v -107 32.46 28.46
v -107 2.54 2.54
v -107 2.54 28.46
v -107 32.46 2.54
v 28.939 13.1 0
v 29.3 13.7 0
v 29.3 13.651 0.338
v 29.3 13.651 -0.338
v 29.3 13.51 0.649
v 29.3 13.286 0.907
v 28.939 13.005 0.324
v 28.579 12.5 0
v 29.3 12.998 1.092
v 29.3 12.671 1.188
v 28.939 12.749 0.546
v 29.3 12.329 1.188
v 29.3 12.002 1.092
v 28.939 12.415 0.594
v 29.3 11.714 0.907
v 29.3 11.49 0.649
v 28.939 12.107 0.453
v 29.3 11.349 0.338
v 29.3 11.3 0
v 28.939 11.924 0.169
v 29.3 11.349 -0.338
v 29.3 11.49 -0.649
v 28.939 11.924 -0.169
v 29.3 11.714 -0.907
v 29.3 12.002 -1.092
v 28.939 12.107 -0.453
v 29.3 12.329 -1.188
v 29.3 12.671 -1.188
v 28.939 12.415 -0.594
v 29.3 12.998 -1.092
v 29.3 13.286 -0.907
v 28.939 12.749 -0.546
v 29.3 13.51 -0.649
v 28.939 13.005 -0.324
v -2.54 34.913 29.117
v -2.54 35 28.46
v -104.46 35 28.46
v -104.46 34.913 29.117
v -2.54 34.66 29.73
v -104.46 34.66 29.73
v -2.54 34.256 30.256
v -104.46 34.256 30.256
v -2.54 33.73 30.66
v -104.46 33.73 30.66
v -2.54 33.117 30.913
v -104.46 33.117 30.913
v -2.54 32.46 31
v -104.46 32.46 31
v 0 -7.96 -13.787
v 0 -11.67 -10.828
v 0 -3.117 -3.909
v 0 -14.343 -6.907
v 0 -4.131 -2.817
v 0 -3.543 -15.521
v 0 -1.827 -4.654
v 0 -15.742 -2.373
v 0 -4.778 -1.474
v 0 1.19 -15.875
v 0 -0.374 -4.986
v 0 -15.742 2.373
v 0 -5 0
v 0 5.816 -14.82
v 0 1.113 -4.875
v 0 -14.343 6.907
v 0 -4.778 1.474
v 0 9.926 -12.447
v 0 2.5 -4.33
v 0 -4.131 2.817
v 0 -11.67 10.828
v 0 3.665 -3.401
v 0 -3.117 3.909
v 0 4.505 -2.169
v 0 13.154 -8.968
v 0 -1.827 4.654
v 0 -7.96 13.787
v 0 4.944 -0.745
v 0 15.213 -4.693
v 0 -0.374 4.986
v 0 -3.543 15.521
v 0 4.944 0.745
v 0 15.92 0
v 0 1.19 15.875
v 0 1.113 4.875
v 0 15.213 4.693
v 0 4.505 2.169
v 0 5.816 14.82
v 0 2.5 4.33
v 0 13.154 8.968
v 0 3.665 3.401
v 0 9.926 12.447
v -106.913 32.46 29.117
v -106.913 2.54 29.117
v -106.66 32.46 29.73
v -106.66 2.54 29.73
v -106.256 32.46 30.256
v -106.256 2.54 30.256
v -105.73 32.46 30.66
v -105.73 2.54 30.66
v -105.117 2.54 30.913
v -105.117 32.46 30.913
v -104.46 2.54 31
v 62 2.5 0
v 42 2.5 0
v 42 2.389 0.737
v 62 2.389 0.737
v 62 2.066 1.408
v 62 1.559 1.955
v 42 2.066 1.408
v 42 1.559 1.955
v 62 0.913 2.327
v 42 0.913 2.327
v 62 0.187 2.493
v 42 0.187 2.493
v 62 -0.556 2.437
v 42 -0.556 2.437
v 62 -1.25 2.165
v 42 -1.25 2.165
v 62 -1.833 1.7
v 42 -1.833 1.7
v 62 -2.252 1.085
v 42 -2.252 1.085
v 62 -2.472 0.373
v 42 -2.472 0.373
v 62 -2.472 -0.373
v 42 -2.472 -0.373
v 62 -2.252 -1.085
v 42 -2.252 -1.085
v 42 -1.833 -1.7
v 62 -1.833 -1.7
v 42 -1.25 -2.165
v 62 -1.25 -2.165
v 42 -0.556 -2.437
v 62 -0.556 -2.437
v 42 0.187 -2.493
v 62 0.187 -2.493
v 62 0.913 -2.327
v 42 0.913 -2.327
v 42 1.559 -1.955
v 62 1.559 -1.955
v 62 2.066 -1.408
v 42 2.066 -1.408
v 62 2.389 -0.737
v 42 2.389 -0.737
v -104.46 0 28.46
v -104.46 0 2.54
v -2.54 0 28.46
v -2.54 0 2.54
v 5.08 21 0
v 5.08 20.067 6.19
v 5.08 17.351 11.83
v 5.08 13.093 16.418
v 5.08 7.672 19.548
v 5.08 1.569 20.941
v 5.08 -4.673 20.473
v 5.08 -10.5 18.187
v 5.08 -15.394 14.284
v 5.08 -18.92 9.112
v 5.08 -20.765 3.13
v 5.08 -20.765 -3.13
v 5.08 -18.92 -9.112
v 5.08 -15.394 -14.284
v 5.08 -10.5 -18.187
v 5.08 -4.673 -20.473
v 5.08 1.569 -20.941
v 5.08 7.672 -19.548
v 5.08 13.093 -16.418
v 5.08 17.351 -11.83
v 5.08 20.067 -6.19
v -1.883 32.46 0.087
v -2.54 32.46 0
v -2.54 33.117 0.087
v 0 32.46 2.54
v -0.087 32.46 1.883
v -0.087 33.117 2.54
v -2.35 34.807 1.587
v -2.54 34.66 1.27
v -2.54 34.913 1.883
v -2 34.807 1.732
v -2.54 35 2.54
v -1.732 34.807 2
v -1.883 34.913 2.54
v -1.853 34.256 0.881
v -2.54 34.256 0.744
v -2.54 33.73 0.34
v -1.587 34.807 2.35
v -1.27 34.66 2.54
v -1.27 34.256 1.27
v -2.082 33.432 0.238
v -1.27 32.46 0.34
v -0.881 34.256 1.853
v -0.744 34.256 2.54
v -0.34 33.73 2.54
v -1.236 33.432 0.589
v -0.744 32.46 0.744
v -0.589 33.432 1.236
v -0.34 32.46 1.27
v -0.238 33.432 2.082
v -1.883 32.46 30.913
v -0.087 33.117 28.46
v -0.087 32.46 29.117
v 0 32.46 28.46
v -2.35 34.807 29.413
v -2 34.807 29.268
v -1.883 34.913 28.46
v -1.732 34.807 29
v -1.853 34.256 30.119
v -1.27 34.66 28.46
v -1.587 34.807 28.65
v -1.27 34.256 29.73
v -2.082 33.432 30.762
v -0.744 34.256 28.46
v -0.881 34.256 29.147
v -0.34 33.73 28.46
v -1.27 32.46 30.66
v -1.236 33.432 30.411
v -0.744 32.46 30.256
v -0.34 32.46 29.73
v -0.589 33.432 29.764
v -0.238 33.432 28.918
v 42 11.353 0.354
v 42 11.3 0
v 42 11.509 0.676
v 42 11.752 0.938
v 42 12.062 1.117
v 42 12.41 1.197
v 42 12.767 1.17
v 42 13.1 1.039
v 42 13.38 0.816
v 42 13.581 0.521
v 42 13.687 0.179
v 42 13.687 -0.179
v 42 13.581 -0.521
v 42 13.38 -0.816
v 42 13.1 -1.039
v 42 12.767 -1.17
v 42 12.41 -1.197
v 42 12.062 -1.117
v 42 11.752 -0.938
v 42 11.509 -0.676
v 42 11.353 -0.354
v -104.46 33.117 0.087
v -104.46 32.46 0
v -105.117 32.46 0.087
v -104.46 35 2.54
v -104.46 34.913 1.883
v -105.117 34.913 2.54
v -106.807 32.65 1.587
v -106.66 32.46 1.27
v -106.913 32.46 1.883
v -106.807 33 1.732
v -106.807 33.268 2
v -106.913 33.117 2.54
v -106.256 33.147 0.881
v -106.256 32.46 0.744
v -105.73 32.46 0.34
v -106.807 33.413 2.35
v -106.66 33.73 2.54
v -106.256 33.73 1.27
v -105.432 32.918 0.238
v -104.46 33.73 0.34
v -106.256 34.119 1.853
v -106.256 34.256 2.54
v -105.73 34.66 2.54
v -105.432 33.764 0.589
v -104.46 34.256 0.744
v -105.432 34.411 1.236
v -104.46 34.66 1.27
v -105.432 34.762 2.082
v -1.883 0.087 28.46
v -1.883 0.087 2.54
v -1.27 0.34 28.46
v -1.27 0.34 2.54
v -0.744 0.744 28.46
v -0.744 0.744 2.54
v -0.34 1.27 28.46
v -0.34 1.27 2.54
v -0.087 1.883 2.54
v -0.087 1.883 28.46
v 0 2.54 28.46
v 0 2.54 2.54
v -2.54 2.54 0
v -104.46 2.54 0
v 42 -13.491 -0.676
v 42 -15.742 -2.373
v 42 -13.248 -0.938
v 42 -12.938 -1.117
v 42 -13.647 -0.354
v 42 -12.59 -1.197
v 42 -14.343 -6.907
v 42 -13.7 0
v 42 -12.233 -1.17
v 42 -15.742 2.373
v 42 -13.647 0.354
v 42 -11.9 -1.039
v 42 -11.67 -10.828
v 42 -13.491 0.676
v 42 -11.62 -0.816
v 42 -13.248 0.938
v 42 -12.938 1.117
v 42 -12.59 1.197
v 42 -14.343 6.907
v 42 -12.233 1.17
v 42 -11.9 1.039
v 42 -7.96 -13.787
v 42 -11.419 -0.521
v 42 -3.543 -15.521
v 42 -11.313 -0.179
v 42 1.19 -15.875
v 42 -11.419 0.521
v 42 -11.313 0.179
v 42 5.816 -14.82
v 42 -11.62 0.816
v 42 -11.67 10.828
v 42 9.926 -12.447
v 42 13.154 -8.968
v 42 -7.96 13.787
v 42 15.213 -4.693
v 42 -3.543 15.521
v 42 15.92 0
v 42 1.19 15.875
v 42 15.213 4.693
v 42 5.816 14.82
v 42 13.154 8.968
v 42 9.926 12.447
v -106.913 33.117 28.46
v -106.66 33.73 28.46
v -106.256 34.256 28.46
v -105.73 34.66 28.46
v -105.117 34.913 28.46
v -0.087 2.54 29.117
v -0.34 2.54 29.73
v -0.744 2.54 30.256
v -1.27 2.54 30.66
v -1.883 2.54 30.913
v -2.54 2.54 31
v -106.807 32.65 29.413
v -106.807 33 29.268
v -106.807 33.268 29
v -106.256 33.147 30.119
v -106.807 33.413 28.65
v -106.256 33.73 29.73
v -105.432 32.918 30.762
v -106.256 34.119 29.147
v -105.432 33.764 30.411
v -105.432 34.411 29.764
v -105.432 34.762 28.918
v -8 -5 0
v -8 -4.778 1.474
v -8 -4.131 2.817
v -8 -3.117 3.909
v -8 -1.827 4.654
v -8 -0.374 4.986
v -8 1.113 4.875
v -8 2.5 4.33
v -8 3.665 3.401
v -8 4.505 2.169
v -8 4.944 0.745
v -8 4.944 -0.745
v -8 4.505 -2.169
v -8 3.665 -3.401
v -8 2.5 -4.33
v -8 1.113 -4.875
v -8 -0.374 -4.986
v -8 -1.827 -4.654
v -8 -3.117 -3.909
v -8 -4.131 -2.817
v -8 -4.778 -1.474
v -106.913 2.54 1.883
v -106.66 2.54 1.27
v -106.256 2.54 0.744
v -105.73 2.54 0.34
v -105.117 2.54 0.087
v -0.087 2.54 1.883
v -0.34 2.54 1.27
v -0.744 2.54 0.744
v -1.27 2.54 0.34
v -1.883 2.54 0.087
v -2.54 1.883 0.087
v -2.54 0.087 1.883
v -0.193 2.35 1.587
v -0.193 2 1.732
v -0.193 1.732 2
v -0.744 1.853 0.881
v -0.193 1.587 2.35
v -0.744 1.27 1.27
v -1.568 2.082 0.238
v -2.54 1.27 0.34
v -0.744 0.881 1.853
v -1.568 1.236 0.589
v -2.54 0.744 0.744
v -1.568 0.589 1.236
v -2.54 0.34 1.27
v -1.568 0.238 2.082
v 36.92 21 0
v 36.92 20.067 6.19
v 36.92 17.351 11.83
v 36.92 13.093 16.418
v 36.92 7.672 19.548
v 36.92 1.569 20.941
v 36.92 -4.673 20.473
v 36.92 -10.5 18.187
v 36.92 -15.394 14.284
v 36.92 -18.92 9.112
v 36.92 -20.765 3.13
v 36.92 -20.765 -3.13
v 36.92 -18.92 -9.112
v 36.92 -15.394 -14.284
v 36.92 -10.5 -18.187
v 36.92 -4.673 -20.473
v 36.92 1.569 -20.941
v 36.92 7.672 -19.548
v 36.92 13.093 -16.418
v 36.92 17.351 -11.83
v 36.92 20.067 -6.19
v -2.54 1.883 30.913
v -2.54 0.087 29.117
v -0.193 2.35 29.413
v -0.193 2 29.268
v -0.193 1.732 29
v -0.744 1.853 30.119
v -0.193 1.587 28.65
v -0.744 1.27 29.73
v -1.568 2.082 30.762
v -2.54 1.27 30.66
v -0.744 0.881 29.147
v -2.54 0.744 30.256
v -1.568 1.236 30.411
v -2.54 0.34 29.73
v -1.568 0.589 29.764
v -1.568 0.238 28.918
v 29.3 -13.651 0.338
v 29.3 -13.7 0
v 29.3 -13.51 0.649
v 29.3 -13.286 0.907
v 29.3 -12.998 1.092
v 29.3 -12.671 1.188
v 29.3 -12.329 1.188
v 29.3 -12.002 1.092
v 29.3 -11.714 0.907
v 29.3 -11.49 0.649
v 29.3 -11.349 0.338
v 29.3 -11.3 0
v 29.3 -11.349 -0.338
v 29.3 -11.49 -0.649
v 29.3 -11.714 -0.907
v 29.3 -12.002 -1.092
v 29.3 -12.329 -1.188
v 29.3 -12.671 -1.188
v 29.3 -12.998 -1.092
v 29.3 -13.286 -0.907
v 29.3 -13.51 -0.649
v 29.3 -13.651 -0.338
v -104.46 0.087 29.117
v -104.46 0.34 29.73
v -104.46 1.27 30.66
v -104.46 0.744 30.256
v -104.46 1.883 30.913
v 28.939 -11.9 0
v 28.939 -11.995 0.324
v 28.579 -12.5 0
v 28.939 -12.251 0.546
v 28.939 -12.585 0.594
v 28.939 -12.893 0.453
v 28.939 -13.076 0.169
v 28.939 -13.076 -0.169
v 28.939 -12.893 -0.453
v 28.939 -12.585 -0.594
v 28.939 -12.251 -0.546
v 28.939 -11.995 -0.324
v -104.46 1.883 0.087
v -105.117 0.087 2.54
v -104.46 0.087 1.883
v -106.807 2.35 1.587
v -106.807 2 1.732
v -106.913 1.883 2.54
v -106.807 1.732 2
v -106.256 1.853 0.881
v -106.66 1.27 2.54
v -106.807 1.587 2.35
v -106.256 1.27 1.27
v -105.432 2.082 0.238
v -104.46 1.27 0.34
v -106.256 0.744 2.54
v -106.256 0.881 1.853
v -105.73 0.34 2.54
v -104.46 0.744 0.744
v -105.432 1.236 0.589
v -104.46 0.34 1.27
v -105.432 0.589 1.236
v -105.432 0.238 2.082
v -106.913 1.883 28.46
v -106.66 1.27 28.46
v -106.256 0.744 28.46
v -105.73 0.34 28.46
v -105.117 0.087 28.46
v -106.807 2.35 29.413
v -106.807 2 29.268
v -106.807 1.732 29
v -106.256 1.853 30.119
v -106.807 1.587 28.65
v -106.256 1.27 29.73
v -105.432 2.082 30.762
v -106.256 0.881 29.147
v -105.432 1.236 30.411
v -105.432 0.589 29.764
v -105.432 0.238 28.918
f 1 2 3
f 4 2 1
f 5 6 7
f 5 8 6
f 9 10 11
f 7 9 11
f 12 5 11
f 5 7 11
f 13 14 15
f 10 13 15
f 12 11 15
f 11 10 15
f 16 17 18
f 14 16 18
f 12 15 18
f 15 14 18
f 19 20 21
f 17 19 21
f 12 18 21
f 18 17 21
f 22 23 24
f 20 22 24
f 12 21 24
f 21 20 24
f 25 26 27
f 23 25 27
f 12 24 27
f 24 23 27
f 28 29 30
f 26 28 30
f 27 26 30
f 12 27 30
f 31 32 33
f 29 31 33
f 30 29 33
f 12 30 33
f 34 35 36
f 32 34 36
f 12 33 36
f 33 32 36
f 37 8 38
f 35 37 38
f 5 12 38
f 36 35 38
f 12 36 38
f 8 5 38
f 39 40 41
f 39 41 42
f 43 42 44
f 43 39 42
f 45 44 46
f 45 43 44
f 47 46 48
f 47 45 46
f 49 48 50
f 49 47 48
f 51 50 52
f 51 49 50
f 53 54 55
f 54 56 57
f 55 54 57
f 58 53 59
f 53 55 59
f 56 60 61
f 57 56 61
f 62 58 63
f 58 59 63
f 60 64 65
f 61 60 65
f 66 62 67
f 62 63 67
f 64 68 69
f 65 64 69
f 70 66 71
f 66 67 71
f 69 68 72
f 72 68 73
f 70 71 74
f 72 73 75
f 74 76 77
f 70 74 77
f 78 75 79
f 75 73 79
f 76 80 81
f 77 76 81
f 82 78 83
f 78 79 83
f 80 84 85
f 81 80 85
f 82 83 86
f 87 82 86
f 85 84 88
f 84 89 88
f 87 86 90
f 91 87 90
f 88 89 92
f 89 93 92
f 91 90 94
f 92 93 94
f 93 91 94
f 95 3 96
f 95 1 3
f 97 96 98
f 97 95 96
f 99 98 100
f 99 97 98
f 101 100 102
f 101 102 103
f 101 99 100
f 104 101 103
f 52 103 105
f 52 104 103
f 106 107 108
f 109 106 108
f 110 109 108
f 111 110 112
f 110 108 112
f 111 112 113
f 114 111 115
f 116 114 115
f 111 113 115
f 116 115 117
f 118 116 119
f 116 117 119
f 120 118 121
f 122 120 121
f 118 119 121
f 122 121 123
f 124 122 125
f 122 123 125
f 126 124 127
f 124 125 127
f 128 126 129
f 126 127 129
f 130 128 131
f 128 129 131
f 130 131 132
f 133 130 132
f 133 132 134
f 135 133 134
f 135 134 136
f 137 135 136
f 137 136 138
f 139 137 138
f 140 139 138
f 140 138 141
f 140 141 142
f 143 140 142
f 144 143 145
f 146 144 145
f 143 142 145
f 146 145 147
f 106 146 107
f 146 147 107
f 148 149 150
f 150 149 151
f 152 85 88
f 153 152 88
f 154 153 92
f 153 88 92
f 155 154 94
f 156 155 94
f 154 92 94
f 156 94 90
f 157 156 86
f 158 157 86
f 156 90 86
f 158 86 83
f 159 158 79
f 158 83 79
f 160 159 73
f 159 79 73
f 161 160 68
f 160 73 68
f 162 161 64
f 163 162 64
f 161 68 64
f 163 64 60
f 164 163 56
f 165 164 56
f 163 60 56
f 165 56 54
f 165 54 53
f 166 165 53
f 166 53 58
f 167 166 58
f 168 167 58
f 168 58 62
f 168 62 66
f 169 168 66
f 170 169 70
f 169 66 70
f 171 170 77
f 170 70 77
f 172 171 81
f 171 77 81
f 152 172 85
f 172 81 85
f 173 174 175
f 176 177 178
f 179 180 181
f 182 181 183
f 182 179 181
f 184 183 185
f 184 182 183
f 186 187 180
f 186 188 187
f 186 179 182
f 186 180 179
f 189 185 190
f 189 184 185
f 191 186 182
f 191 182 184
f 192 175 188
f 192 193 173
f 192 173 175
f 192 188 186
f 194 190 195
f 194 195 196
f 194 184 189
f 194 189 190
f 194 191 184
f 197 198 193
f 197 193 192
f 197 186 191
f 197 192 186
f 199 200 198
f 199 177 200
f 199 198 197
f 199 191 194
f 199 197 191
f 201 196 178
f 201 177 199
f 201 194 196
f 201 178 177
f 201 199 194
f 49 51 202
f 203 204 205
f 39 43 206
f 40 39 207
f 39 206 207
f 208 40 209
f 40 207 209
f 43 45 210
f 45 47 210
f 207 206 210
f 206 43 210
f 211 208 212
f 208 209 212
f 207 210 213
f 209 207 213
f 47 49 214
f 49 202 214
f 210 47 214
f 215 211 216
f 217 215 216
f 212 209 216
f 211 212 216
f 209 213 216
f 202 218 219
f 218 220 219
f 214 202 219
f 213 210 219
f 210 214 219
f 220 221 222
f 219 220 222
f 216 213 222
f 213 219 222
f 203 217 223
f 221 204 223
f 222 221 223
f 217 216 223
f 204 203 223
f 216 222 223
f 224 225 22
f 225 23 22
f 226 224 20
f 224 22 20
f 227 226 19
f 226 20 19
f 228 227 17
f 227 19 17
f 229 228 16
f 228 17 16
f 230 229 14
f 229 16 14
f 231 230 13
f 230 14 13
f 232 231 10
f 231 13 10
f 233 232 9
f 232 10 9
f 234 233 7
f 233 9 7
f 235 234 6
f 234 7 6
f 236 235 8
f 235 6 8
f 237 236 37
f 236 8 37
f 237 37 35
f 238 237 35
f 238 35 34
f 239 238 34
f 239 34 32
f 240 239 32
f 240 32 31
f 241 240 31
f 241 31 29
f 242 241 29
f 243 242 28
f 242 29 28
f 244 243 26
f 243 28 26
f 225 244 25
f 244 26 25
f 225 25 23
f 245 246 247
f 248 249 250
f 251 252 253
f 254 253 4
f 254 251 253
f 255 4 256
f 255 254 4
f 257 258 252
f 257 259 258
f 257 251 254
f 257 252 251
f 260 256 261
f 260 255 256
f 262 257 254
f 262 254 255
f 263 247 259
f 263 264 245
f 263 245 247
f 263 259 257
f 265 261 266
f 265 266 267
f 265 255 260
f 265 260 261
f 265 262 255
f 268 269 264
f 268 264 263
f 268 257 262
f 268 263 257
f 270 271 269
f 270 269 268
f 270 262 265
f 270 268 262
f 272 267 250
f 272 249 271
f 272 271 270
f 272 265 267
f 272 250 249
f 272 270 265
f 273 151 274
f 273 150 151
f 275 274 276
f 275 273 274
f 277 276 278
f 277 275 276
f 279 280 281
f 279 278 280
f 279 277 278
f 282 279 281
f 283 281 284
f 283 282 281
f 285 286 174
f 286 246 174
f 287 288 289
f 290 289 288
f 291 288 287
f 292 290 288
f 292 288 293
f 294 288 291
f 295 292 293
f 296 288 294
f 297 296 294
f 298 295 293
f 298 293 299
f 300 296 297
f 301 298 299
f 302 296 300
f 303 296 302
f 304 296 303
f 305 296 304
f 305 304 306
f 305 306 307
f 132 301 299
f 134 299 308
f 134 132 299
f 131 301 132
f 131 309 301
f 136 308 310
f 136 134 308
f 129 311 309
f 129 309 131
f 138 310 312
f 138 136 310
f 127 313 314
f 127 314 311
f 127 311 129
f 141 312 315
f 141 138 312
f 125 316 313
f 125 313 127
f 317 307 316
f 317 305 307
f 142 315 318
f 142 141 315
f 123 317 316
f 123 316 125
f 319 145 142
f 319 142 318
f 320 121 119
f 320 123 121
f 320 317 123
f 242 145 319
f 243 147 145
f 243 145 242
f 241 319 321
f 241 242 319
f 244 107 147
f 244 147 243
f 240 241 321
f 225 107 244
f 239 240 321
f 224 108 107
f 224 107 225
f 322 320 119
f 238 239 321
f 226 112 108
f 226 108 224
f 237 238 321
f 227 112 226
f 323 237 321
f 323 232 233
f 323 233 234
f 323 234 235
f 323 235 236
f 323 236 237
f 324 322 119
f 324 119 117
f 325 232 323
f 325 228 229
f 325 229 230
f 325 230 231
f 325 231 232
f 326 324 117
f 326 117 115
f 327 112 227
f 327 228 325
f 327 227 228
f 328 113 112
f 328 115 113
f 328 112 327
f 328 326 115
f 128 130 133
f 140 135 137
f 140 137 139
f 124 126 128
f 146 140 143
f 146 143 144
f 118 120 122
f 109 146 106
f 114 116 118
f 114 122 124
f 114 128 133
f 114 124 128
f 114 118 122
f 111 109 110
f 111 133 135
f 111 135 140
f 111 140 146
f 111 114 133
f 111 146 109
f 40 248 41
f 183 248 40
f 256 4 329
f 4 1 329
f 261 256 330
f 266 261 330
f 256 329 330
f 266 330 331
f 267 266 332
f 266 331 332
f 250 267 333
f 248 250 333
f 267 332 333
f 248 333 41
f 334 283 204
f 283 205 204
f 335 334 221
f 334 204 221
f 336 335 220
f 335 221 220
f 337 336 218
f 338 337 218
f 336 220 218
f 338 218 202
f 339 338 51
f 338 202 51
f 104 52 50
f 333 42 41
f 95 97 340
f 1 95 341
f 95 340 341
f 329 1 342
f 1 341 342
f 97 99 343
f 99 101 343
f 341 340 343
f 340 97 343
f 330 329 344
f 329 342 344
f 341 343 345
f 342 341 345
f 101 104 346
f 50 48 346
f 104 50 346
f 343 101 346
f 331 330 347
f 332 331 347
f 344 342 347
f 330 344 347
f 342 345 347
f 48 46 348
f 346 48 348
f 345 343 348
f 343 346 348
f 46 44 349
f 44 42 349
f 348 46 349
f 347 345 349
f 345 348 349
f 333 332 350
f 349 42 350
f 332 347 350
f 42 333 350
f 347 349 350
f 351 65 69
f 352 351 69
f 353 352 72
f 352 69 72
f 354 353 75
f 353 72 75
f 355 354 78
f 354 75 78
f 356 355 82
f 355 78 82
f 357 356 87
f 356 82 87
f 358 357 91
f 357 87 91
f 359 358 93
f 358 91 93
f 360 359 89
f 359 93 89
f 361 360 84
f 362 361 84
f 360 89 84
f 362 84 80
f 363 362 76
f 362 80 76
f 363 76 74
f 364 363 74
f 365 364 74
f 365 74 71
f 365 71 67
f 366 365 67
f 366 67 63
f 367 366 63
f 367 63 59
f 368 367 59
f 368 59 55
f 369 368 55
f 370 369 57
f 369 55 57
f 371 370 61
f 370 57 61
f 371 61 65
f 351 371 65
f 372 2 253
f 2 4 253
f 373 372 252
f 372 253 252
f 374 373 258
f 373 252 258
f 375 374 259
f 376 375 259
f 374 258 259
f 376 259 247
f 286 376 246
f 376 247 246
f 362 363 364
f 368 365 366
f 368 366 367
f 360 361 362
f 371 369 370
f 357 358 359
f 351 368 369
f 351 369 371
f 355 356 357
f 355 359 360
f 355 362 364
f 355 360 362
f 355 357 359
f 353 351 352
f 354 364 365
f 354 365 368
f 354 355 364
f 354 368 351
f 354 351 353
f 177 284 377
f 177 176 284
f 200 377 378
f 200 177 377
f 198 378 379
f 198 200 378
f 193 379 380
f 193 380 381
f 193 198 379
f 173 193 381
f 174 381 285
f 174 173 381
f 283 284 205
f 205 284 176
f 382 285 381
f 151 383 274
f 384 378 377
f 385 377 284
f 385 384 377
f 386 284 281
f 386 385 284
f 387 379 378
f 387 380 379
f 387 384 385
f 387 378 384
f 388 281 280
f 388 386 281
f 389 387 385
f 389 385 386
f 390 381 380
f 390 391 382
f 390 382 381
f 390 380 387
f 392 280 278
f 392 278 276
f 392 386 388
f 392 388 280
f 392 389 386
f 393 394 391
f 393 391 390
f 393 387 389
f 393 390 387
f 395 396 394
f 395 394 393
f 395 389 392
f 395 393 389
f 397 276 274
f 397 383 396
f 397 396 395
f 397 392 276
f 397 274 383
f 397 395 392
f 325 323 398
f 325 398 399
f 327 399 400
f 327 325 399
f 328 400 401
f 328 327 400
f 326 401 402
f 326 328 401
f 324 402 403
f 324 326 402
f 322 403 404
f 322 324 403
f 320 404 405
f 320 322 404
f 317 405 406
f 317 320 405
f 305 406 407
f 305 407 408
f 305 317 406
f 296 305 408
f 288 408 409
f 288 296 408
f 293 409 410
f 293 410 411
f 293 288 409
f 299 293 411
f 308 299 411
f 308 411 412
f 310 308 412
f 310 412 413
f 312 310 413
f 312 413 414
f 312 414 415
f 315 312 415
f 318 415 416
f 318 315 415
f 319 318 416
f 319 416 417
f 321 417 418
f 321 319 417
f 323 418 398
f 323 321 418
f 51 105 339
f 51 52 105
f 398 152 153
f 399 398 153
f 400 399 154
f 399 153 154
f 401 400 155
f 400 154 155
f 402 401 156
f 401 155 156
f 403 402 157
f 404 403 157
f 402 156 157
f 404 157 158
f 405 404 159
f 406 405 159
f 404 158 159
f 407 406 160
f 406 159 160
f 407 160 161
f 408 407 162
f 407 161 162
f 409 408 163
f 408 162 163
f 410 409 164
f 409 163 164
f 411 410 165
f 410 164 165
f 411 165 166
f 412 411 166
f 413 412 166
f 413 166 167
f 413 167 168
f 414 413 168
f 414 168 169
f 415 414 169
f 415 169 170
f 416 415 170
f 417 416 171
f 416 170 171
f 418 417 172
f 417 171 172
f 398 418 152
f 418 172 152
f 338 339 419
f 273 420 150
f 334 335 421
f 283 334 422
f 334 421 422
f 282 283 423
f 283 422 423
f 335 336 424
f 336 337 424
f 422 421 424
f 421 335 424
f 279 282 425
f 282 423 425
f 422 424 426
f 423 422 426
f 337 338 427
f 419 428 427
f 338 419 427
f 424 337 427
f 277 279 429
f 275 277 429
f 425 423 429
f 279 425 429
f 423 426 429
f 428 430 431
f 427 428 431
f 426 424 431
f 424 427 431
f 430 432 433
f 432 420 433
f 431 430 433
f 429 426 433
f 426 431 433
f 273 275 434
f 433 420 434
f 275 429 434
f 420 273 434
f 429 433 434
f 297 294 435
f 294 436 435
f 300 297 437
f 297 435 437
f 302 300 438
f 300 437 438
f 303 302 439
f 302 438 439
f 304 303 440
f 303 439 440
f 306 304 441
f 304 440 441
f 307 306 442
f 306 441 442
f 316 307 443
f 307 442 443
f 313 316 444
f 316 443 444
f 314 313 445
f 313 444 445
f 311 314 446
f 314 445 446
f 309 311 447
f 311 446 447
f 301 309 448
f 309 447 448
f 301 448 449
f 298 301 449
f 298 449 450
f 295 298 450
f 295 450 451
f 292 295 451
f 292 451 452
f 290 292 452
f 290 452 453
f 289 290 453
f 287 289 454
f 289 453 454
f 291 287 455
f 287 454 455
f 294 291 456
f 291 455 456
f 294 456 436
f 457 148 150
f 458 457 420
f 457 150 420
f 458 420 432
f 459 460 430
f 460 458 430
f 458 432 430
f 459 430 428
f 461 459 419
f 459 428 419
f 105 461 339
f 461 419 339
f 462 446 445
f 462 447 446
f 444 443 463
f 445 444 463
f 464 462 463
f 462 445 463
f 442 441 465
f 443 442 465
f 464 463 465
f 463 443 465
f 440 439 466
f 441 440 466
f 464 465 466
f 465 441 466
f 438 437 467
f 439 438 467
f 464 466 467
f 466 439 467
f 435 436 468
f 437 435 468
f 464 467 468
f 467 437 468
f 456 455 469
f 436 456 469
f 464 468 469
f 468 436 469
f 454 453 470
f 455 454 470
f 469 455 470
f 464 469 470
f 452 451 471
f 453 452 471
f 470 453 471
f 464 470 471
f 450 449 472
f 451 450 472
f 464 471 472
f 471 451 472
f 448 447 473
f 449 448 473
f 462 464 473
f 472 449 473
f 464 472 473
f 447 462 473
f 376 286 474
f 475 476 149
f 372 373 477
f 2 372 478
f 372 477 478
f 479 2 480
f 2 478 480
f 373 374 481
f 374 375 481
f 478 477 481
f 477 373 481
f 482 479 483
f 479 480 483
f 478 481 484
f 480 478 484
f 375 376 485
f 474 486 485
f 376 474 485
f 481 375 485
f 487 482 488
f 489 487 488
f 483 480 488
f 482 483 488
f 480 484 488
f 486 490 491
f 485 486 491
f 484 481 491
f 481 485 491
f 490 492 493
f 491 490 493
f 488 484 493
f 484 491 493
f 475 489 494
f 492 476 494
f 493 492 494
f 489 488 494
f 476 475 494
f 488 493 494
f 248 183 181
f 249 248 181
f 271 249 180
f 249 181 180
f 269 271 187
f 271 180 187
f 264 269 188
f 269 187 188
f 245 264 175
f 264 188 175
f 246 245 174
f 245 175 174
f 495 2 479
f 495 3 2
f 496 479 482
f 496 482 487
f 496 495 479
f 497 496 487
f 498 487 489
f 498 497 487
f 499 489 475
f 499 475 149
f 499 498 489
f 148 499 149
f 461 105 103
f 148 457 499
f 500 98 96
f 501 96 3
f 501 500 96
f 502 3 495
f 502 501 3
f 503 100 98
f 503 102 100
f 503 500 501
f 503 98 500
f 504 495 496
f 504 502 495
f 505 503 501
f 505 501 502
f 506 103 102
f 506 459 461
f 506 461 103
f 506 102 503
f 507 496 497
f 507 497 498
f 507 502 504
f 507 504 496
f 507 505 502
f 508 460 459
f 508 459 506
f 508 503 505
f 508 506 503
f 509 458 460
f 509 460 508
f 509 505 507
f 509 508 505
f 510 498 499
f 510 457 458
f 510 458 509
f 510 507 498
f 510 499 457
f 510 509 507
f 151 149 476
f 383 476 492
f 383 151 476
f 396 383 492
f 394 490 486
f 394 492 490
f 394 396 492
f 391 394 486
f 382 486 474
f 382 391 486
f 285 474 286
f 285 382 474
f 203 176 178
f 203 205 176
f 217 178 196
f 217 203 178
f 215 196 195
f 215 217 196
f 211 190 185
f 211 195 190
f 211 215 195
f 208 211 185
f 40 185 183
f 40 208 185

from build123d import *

# Parameters (mm, degrees)
F0_R      = 21
F1_DEPTH  = 42
F2_SIZE2  = 5.08
F2_SIZE   = 5.08
F3_R      = 2.5
F4_DEPTH  = 20
F6_D      = 2.4
F6_DEPTH  = 12.7
F6_TIP    = 0.7210327428
F7_W      = 107
F7_H      = 35
F8_DEPTH  = 31
F9_R      = 2.54
F10_R     = 5
F11_DEPTH = 8


with BuildPart() as f1:
    # F0 (on Right) → F1 (new body)
    with BuildSketch(Plane.YZ):
        Circle(F0_R)
    extrude(amount=F1_DEPTH)

    # F2
    f2_edges = [f1.edges().sort_by_distance(p)[0] for p in [
        (0, -21, 0),
        (42, -21, 0),
    ]]
    chamfer(f2_edges, length=F2_SIZE, length2=F2_SIZE2)

    # F3 (on face) → F4 (join)
    with BuildSketch(Plane.YZ.offset(42)):
        Circle(F3_R)
    extrude(amount=F4_DEPTH)

    # F6
    with Locations(Plane.YZ.offset(42)):
        with Locations((-12.5, 0), (12.5, 0)):
            Hole(F6_D / 2, depth=F6_DEPTH)
            with Locations((0, 0, -(F6_DEPTH + F6_TIP / 2))):  # 118° drill point
                Cone(0, F6_D / 2, F6_TIP, mode=Mode.SUBTRACT)

    # F10 (on face) → F11 (join)
    with BuildSketch(Plane(origin=(0, 0, 0), x_dir=(0, -1, 0), z_dir=(-1, 0, 0))):
        Circle(F10_R)
    extrude(amount=F11_DEPTH)


with BuildPart() as f8:
    # F7 (on Top) → F8 (new body)
    with BuildSketch(Plane.XY):
        with Locations((-53.5, 17.5)):
            Rectangle(F7_W, F7_H)
    extrude(amount=F8_DEPTH)

    # F9
    f9_edges = [f8.edges().sort_by_distance(p)[0] for p in [
        (-53.5, 0, 31),
        (0, 17.5, 31),
        (-53.5, 35, 31),
        (-107, 17.5, 31),
        (-53.5, 0, 0),
        (0, 17.5, 0),
        (-53.5, 35, 0),
        (-107, 17.5, 0),
        (0, 35, 15.5),
        (-107, 35, 15.5),
        (-107, 0, 15.5),
        (0, 0, 15.5),
    ]]
    fillet(f9_edges, radius=F9_R)


solid = Compound([f1.part, f8.part])
